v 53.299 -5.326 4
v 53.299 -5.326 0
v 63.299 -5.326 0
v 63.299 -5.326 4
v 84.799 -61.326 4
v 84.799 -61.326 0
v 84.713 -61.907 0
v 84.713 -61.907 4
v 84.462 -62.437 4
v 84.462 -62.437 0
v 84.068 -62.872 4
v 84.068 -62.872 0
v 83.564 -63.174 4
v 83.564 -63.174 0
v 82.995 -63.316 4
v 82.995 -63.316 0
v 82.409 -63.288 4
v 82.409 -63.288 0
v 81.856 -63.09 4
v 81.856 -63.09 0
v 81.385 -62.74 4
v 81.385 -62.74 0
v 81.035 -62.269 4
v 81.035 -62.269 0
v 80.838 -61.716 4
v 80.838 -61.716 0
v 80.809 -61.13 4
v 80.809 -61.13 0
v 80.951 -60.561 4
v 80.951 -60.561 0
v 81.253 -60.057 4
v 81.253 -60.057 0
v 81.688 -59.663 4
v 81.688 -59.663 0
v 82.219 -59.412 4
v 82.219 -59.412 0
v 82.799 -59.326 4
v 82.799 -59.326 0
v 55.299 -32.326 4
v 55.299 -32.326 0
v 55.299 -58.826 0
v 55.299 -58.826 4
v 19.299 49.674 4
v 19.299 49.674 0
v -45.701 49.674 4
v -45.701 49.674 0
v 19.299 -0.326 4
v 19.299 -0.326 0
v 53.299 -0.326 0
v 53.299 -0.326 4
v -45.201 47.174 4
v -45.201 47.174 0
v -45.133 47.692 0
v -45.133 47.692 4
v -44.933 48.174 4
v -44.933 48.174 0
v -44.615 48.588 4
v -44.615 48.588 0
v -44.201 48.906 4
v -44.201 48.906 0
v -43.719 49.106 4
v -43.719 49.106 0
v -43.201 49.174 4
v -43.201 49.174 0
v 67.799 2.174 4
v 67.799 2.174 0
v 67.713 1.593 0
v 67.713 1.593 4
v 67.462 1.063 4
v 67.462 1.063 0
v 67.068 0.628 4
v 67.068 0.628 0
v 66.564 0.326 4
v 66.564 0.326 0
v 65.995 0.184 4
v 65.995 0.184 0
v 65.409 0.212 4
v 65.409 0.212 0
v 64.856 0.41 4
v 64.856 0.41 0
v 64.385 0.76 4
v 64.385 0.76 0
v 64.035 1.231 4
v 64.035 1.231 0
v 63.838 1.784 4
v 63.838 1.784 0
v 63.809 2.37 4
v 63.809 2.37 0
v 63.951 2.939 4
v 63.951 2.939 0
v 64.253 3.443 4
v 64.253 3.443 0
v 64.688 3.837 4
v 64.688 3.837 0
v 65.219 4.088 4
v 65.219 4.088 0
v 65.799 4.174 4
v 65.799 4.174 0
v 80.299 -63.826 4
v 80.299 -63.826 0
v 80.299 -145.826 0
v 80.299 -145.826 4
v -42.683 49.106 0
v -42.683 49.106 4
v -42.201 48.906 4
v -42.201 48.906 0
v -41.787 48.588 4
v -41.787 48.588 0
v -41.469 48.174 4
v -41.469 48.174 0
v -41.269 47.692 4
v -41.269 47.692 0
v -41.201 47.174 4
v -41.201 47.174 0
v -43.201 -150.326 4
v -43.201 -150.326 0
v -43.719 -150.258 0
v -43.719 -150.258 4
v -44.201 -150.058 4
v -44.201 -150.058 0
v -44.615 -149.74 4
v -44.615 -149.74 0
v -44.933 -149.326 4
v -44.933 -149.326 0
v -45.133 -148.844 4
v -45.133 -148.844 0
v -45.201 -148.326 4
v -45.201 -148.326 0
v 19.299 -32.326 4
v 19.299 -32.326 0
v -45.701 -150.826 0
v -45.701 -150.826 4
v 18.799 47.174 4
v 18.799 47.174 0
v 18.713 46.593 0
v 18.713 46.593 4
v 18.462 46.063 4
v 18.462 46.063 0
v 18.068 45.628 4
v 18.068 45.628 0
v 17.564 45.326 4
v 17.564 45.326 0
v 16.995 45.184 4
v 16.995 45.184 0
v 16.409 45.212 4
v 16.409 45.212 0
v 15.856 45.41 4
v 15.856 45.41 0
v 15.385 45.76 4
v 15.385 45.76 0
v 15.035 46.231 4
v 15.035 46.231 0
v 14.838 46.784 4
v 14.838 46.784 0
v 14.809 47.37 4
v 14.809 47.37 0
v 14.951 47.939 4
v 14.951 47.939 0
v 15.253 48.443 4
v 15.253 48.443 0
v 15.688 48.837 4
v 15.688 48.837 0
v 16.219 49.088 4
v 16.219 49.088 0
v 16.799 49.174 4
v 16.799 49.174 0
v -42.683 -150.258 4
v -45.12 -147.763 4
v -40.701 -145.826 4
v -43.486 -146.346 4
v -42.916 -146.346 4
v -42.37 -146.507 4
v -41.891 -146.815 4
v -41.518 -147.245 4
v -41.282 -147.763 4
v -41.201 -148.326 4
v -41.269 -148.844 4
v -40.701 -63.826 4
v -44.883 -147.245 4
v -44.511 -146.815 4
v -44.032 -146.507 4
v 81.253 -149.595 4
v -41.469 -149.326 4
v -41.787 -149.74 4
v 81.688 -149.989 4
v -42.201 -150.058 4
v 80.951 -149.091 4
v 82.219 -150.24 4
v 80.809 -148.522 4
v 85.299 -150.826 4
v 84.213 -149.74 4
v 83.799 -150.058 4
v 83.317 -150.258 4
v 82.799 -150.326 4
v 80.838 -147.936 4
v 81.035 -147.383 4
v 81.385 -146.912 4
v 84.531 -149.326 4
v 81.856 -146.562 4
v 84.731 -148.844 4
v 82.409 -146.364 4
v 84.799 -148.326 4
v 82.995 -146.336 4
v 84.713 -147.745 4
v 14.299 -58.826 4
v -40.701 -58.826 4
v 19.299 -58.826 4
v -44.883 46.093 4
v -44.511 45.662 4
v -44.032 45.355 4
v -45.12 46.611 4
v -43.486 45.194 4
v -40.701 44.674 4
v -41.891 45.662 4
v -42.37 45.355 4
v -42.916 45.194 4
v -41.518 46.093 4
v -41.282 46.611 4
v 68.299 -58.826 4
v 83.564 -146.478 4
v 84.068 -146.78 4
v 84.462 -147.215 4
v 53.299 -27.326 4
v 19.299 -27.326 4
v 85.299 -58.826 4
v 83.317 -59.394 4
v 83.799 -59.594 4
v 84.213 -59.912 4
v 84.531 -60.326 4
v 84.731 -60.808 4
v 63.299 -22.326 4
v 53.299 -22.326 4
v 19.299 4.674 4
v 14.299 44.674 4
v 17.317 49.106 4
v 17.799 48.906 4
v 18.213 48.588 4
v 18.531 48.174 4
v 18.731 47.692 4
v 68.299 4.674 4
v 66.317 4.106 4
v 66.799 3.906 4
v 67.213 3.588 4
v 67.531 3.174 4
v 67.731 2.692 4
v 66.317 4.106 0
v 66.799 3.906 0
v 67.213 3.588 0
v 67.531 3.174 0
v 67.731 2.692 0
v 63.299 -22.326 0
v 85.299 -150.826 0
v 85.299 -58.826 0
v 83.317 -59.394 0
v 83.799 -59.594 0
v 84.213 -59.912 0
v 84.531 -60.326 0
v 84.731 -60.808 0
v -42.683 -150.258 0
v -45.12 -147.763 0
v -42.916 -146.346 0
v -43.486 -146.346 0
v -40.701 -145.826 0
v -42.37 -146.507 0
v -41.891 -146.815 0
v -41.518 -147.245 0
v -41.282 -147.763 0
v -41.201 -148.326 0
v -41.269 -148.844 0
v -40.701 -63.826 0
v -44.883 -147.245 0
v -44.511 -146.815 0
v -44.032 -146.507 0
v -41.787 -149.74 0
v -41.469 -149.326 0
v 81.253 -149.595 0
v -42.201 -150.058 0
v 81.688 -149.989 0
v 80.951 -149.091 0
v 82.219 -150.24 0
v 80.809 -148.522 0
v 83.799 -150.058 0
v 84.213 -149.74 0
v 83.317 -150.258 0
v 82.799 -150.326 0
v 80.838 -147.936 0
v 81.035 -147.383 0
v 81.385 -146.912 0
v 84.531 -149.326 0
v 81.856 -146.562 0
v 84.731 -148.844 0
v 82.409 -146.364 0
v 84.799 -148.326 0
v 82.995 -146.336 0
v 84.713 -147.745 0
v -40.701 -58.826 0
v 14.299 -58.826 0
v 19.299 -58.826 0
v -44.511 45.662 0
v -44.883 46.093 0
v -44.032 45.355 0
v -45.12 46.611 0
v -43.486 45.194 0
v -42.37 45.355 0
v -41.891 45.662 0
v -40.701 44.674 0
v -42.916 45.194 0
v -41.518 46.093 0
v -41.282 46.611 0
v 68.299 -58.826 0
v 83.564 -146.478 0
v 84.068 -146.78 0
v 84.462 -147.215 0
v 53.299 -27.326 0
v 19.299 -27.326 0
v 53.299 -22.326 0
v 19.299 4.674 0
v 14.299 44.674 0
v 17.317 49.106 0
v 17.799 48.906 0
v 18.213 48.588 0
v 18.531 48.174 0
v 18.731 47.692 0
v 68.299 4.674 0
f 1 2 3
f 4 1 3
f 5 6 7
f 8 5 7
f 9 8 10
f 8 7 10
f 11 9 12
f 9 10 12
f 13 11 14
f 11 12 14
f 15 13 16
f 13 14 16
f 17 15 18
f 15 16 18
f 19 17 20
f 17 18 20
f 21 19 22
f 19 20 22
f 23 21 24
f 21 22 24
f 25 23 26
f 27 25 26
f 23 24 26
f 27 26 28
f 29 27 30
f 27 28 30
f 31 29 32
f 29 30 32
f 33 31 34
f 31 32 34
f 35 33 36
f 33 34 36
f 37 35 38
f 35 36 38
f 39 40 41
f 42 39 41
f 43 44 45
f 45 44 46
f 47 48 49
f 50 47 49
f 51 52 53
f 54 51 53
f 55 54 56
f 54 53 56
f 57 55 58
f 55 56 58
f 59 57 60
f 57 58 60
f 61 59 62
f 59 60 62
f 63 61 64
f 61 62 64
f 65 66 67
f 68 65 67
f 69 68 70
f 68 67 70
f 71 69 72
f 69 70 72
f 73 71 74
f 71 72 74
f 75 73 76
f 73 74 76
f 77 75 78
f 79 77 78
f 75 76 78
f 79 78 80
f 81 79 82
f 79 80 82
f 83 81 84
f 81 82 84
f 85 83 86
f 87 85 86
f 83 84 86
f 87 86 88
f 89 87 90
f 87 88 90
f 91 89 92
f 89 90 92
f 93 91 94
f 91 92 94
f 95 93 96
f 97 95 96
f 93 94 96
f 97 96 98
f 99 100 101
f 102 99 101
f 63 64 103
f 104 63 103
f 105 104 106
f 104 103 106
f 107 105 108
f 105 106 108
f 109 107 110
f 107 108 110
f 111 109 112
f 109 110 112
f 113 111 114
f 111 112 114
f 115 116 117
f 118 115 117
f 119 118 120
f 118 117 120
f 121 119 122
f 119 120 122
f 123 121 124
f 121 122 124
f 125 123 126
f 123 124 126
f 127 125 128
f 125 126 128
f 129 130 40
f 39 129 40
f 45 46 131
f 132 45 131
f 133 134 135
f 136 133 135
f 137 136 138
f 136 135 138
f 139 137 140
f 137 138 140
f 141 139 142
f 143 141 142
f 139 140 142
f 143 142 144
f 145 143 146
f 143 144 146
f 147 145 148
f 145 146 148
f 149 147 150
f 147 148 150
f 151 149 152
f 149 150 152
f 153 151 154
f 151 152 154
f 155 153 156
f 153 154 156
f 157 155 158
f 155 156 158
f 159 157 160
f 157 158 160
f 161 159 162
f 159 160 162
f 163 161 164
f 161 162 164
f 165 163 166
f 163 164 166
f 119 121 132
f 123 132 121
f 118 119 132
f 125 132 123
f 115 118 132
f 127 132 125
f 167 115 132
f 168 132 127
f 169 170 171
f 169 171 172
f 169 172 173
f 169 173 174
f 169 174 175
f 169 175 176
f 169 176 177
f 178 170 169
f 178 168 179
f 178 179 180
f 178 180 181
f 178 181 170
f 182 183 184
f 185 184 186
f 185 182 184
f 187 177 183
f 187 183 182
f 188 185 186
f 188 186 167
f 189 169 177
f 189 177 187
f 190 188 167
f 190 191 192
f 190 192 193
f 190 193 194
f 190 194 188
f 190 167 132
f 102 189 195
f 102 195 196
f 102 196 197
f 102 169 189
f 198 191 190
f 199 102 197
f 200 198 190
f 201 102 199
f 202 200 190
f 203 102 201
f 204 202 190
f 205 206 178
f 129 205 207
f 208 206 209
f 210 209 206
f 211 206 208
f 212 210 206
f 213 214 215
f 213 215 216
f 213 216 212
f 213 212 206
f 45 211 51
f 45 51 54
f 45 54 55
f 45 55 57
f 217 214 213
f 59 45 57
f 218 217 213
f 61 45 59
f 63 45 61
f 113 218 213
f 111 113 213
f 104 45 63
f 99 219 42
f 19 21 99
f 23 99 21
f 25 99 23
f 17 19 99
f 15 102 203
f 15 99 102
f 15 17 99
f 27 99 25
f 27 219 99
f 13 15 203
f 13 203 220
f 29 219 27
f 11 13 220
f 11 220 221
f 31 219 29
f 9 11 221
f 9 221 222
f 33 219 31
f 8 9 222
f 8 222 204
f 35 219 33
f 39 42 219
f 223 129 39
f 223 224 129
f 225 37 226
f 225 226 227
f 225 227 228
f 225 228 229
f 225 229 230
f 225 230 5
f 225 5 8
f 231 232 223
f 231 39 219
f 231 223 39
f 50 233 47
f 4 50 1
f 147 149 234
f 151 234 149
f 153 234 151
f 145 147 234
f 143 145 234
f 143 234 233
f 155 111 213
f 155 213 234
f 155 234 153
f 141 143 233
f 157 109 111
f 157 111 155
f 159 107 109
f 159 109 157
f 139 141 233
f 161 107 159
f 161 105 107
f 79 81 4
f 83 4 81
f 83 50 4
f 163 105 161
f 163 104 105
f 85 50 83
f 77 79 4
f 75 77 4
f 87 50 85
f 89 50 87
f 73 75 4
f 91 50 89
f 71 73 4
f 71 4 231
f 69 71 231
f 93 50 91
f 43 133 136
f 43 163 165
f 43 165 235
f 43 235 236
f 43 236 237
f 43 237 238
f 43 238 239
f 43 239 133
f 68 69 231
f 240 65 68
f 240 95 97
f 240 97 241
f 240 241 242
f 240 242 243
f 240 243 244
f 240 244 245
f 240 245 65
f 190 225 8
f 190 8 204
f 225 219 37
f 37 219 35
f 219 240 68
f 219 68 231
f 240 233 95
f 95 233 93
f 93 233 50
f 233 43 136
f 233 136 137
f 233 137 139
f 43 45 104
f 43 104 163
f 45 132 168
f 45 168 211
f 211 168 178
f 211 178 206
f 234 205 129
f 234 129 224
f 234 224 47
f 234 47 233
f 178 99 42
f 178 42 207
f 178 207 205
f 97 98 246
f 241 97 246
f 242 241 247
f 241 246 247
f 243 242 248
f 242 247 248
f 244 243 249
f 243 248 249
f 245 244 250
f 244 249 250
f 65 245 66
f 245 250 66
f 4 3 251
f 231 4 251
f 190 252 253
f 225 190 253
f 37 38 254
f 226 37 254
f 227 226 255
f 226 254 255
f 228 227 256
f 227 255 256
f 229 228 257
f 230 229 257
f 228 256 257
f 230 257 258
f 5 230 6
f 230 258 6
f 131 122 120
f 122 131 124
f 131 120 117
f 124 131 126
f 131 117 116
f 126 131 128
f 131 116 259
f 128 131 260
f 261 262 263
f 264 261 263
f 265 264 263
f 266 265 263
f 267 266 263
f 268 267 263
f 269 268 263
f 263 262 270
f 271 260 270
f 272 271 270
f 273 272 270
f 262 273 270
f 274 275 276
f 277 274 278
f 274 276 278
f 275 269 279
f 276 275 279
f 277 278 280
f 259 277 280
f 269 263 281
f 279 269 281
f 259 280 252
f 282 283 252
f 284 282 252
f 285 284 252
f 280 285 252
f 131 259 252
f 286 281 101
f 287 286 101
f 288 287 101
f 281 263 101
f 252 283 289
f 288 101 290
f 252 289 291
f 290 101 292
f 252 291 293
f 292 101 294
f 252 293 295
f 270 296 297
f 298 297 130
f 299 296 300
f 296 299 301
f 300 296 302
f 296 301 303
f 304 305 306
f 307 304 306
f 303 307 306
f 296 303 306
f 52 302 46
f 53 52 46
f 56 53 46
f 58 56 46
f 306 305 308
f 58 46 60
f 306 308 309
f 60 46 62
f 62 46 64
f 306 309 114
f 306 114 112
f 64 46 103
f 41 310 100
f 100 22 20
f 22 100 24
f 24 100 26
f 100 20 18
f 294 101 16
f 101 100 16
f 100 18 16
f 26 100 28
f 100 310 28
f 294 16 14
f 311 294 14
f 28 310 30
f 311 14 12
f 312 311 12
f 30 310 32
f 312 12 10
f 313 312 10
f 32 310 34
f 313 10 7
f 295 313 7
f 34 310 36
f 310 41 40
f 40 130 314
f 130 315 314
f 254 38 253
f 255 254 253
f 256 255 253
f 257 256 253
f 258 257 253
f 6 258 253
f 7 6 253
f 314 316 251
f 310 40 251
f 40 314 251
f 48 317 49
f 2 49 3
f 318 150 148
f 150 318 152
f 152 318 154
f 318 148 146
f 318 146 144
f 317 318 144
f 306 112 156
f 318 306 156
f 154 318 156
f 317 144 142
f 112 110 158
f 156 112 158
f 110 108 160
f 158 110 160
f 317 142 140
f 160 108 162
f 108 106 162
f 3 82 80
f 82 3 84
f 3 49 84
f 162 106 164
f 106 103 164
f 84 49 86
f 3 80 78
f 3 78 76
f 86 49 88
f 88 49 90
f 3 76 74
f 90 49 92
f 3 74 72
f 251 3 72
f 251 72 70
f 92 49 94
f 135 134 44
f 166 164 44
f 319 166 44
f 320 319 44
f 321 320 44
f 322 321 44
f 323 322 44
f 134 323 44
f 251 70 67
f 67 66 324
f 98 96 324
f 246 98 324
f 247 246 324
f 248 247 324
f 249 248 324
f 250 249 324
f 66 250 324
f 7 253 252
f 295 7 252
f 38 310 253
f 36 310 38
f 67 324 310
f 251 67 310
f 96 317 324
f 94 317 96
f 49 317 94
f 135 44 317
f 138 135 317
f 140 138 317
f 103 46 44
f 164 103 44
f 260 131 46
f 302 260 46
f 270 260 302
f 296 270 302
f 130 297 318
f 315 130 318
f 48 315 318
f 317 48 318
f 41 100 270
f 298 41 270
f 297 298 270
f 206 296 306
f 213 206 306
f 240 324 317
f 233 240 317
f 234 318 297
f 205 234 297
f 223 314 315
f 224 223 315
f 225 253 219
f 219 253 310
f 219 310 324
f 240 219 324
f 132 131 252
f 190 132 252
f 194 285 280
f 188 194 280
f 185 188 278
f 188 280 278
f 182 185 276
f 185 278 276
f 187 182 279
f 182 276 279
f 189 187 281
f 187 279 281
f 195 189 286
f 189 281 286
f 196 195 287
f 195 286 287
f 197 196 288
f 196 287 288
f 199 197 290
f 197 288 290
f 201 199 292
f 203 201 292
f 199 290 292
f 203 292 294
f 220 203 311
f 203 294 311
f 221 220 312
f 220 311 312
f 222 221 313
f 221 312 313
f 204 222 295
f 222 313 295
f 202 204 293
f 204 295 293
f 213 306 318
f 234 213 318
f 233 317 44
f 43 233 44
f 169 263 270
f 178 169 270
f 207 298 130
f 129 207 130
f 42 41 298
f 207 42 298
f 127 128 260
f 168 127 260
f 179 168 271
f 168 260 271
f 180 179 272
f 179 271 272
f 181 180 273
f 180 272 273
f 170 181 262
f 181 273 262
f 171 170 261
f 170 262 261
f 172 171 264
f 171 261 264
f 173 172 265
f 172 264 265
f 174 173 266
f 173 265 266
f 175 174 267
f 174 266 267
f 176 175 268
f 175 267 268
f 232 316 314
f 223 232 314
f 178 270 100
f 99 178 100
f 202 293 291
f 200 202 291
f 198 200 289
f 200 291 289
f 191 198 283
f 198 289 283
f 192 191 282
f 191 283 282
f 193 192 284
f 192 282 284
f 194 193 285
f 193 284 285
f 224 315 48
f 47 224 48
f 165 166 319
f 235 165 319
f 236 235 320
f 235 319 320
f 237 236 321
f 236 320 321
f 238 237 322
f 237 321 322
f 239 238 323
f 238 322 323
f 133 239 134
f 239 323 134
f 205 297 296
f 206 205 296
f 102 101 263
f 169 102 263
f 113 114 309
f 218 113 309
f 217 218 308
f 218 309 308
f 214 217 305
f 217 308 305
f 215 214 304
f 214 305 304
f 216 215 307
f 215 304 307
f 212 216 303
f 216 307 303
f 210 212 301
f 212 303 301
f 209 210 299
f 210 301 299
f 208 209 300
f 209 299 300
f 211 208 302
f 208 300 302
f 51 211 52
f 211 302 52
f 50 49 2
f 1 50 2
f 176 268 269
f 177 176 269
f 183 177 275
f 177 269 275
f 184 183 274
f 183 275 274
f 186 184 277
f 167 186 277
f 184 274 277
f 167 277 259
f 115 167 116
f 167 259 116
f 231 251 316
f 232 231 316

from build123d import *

# Parameters (mm, degrees)
F0_W     = 5
F0_H     = 5
F1_DEPTH = 4


with BuildPart() as f1:
    # F0 (on Top) → F1 (new body)
    with BuildSketch(Plane.XY):
        with BuildLine():
            Line((82.7990943193, -150.3260023594), (82.7990943193, -150.8260023594))
            Line((82.7990943193, -150.8260023594), (85.2990943193, -150.8260023594))
            Line((85.2990943193, -150.8260023594), (85.2990943193, -148.3260023594))
            Line((85.2990943193, -148.3260023594), (84.7990943193, -148.3260023594))
            ThreePointArc((84.7990943193, -148.3260023594), (84.2133078817, -149.7402159218), (82.7990943193, -150.3260023594))
        make_face()
        with BuildLine():
            Line((-45.2009056807, -148.3260023594), (-45.7009056807, -148.3260023594))
            Line((-45.7009056807, -148.3260023594), (-45.7009056807, -150.8260023594))
            Line((-45.7009056807, -150.8260023594), (-43.2009056807, -150.8260023594))
            Line((-43.2009056807, -150.8260023594), (-43.2009056807, -150.3260023594))
            ThreePointArc((-43.2009056807, -150.3260023594), (-44.615119243, -149.7402159218), (-45.2009056807, -148.3260023594))
        make_face()
        with BuildLine():
            Line((-43.2009056807, 49.1739976406), (-43.2009056807, 49.6739976406))
            Line((-43.2009056807, 49.6739976406), (-45.7009056807, 49.6739976406))
            Line((-45.7009056807, 49.6739976406), (-45.7009056807, 47.1739976406))
            Line((-45.7009056807, 47.1739976406), (-45.2009056807, 47.1739976406))
            ThreePointArc((-45.2009056807, 47.1739976406), (-44.615119243, 48.588211203), (-43.2009056807, 49.1739976406))
        make_face()
        with BuildLine():
            Line((85.2990943193, -61.3260023594), (85.2990943193, -58.8260023594))
            Line((85.2990943193, -58.8260023594), (82.7990943193, -58.8260023594))
            Line((82.7990943193, -58.8260023594), (82.7990943193, -59.3260023594))
            ThreePointArc((82.7990943193, -59.3260023594), (84.2133078817, -59.911788797), (84.7990943193, -61.3260023594))
            Line((84.7990943193, -61.3260023594), (85.2990943193, -61.3260023594))
        make_face()
        with BuildLine():
            Line((19.2990943193, 49.6739976406), (16.7990943193, 49.6739976406))
            Line((16.7990943193, 49.6739976406), (16.7990943193, 49.1739976406))
            ThreePointArc((16.7990943193, 49.1739976406), (18.2133078817, 48.588211203), (18.7990943193, 47.1739976406))
            Line((18.7990943193, 47.1739976406), (19.2990943193, 47.1739976406))
            Line((19.2990943193, 47.1739976406), (19.2990943193, 49.6739976406))
        make_face()
        with BuildLine():
            Line((85.2990943193, -63.8260023594), (85.2990943193, -61.3260023594))
            Line((85.2990943193, -61.3260023594), (84.7990943193, -61.3260023594))
            ThreePointArc((84.7990943193, -61.3260023594), (81.384880757, -62.7402159218), (82.7990943193, -59.3260023594))
            Line((82.7990943193, -59.3260023594), (82.7990943193, -58.8260023594))
            Line((82.7990943193, -58.8260023594), (80.2990943193, -58.8260023594))
            Line((80.2990943193, -58.8260023594), (80.2990943193, -63.8260023594))
            Line((80.2990943193, -63.8260023594), (85.2990943193, -63.8260023594))
        make_face()
        with BuildLine():
            Line((14.2990943193, 49.6739976406), (14.2990943193, 44.6739976406))
            Line((14.2990943193, 44.6739976406), (16.7990943193, 44.6739976406))
            Line((16.7990943193, 44.6739976406), (19.2990943193, 44.6739976406))
            Line((19.2990943193, 44.6739976406), (19.2990943193, 47.1739976406))
            Line((19.2990943193, 47.1739976406), (18.7990943193, 47.1739976406))
            ThreePointArc((18.7990943193, 47.1739976406), (15.384880757, 45.7597840782), (16.7990943193, 49.1739976406))
            Line((16.7990943193, 49.1739976406), (16.7990943193, 49.6739976406))
            Line((16.7990943193, 49.6739976406), (14.2990943193, 49.6739976406))
        make_face()
        with BuildLine():
            Line((-37.7009056807, -58.8260023594), (-40.7009056807, -58.8260023594))
            Line((-40.7009056807, -58.8260023594), (-40.7009056807, -52.8260023594))
            Line((-40.7009056807, -52.8260023594), (-40.7009056807, 28.4739976406))
            Line((-40.7009056807, 28.4739976406), (-40.7009056807, 44.6739976406))
            Line((-40.7009056807, 44.6739976406), (14.2990943193, 44.6739976406))
            Line((14.2990943193, 44.6739976406), (14.2990943193, 49.6739976406))
            Line((14.2990943193, 49.6739976406), (-43.2009056807, 49.6739976406))
            Line((-43.2009056807, 49.6739976406), (-43.2009056807, 49.1739976406))
            ThreePointArc((-43.2009056807, 49.1739976406), (-41.7866921183, 48.588211203), (-41.2009056807, 47.1739976406))
            ThreePointArc((-41.2009056807, 47.1739976406), (-43.2009056807, 45.1739976406), (-45.2009056807, 47.1739976406))
            Line((-45.2009056807, 47.1739976406), (-45.7009056807, 47.1739976406))
            Line((-45.7009056807, 47.1739976406), (-45.7009056807, -148.3260023594))
            Line((-45.7009056807, -148.3260023594), (-45.2009056807, -148.3260023594))
            ThreePointArc((-45.2009056807, -148.3260023594), (-43.2009056807, -146.3260023594), (-41.2009056807, -148.3260023594))
            ThreePointArc((-41.2009056807, -148.3260023594), (-41.7866921183, -149.7402159218), (-43.2009056807, -150.3260023594))
            Line((-43.2009056807, -150.3260023594), (-43.2009056807, -150.8260023594))
            Line((-43.2009056807, -150.8260023594), (82.7990943193, -150.8260023594))
            Line((82.7990943193, -150.8260023594), (82.7990943193, -150.3260023594))
            ThreePointArc((82.7990943193, -150.3260023594), (81.384880757, -146.911788797), (84.7990943193, -148.3260023594))
            Line((84.7990943193, -148.3260023594), (85.2990943193, -148.3260023594))
            Line((85.2990943193, -148.3260023594), (85.2990943193, -63.8260023594))
            Line((85.2990943193, -63.8260023594), (80.2990943193, -63.8260023594))
            Line((80.2990943193, -63.8260023594), (80.2990943193, -58.8260023594))
            Line((80.2990943193, -58.8260023594), (68.2990943193, -58.8260023594))
            Line((68.2990943193, -58.8260023594), (68.2990943193, -22.3260023594))
            Line((68.2990943193, -22.3260023594), (68.2990943193, -5.3260023594))
            Line((68.2990943193, -5.3260023594), (63.2990943193, -5.3260023594))
            Line((63.2990943193, -5.3260023594), (63.2990943193, -22.3260023594))
            Line((63.2990943193, -22.3260023594), (53.2990943193, -22.3260023594))
            Line((53.2990943193, -22.3260023594), (53.2990943193, -25.3760023594))
            Line((53.2990943193, -25.3760023594), (53.2990943193, -27.3260023594))
            Line((53.2990943193, -27.3260023594), (51.3490943193, -27.3260023594))
            Line((51.3490943193, -27.3260023594), (28.5490943193, -27.3260023594))
            Line((28.5490943193, -27.3260023594), (19.2990943193, -27.3260023594))
            Line((19.2990943193, -27.3260023594), (19.2990943193, -25.3760023594))
            Line((19.2990943193, -25.3760023594), (19.2990943193, -2.2760023594))
            Line((19.2990943193, -2.2760023594), (19.2990943193, -0.3260023594))
            Line((19.2990943193, -0.3260023594), (14.2990943193, -0.3260023594))
            Line((14.2990943193, -0.3260023594), (14.2990943193, -27.3260023594))
            Line((14.2990943193, -27.3260023594), (14.2990943193, -32.3260023594))
            Line((14.2990943193, -32.3260023594), (14.2990943193, -47.2260023594))
            Line((14.2990943193, -47.2260023594), (14.2990943193, -58.8260023594))
            Line((14.2990943193, -58.8260023594), (11.2990943193, -58.8260023594))
            Line((11.2990943193, -58.8260023594), (-37.7009056807, -58.8260023594))
        make_face()
        Polygon((76.8990943193, -63.8260023594), (80.2990943193, -63.8260023594), (80.2990943193, -67.2260023594), (80.2990943193, -142.4260023594), (80.2990943193, -145.8260023594), (76.8990943193, -145.8260023594), (-37.3009056807, -145.8260023594), (-40.7009056807, -145.8260023594), (-40.7009056807, -142.4260023594), (-40.7009056807, -67.2260023594), (-40.7009056807, -63.8260023594), (-37.3009056807, -63.8260023594), (14.2990943193, -63.8260023594), (19.2990943193, -63.8260023594), align=None, mode=Mode.SUBTRACT)
        Polygon((53.5990943193, -58.8260023594), (19.2990943193, -58.8260023594), (19.2990943193, -32.3260023594), (53.5990943193, -32.3260023594), (55.2990943193, -32.3260023594), (55.2990943193, -34.0260023594), (55.2990943193, -57.1260023594), (55.2990943193, -58.8260023594), align=None, mode=Mode.SUBTRACT)
        with Locations((16.7990943193, 2.1739976406)):
            Rectangle(F0_W, F0_H)
        Polygon((16.7990943193, 44.6739976406), (14.2990943193, 44.6739976406), (14.2990943193, 29.8739976406), (14.2990943193, 4.6739976406), (19.2990943193, 4.6739976406), (19.2990943193, 44.6739976406), align=None)
        with BuildLine():
            Line((65.7990943193, 4.6739976406), (19.2990943193, 4.6739976406))
            Line((19.2990943193, 4.6739976406), (19.2990943193, -0.3260023594))
            Line((19.2990943193, -0.3260023594), (28.5490943193, -0.3260023594))
            Line((28.5490943193, -0.3260023594), (51.3490943193, -0.3260023594))
            Line((51.3490943193, -0.3260023594), (53.2990943193, -0.3260023594))
            Line((53.2990943193, -0.3260023594), (53.2990943193, -2.2760023594))
            Line((53.2990943193, -2.2760023594), (53.2990943193, -5.3260023594))
            Line((53.2990943193, -5.3260023594), (63.2990943193, -5.3260023594))
            Line((63.2990943193, -5.3260023594), (68.2990943193, -5.3260023594))
            Line((68.2990943193, -5.3260023594), (68.2990943193, 2.1739976406))
            Line((68.2990943193, 2.1739976406), (67.7990943193, 2.1739976406))
            ThreePointArc((67.7990943193, 2.1739976406), (64.384880757, 0.7597840782), (65.7990943193, 4.1739976406))
            Line((65.7990943193, 4.1739976406), (65.7990943193, 4.6739976406))
        make_face()
        with BuildLine():
            Line((68.2990943193, 4.6739976406), (65.7990943193, 4.6739976406))
            Line((65.7990943193, 4.6739976406), (65.7990943193, 4.1739976406))
            ThreePointArc((65.7990943193, 4.1739976406), (67.2133078817, 3.588211203), (67.7990943193, 2.1739976406))
            Line((67.7990943193, 2.1739976406), (68.2990943193, 2.1739976406))
            Line((68.2990943193, 2.1739976406), (68.2990943193, 4.6739976406))
        make_face()
    extrude(amount=F1_DEPTH)


solid = f1.part
